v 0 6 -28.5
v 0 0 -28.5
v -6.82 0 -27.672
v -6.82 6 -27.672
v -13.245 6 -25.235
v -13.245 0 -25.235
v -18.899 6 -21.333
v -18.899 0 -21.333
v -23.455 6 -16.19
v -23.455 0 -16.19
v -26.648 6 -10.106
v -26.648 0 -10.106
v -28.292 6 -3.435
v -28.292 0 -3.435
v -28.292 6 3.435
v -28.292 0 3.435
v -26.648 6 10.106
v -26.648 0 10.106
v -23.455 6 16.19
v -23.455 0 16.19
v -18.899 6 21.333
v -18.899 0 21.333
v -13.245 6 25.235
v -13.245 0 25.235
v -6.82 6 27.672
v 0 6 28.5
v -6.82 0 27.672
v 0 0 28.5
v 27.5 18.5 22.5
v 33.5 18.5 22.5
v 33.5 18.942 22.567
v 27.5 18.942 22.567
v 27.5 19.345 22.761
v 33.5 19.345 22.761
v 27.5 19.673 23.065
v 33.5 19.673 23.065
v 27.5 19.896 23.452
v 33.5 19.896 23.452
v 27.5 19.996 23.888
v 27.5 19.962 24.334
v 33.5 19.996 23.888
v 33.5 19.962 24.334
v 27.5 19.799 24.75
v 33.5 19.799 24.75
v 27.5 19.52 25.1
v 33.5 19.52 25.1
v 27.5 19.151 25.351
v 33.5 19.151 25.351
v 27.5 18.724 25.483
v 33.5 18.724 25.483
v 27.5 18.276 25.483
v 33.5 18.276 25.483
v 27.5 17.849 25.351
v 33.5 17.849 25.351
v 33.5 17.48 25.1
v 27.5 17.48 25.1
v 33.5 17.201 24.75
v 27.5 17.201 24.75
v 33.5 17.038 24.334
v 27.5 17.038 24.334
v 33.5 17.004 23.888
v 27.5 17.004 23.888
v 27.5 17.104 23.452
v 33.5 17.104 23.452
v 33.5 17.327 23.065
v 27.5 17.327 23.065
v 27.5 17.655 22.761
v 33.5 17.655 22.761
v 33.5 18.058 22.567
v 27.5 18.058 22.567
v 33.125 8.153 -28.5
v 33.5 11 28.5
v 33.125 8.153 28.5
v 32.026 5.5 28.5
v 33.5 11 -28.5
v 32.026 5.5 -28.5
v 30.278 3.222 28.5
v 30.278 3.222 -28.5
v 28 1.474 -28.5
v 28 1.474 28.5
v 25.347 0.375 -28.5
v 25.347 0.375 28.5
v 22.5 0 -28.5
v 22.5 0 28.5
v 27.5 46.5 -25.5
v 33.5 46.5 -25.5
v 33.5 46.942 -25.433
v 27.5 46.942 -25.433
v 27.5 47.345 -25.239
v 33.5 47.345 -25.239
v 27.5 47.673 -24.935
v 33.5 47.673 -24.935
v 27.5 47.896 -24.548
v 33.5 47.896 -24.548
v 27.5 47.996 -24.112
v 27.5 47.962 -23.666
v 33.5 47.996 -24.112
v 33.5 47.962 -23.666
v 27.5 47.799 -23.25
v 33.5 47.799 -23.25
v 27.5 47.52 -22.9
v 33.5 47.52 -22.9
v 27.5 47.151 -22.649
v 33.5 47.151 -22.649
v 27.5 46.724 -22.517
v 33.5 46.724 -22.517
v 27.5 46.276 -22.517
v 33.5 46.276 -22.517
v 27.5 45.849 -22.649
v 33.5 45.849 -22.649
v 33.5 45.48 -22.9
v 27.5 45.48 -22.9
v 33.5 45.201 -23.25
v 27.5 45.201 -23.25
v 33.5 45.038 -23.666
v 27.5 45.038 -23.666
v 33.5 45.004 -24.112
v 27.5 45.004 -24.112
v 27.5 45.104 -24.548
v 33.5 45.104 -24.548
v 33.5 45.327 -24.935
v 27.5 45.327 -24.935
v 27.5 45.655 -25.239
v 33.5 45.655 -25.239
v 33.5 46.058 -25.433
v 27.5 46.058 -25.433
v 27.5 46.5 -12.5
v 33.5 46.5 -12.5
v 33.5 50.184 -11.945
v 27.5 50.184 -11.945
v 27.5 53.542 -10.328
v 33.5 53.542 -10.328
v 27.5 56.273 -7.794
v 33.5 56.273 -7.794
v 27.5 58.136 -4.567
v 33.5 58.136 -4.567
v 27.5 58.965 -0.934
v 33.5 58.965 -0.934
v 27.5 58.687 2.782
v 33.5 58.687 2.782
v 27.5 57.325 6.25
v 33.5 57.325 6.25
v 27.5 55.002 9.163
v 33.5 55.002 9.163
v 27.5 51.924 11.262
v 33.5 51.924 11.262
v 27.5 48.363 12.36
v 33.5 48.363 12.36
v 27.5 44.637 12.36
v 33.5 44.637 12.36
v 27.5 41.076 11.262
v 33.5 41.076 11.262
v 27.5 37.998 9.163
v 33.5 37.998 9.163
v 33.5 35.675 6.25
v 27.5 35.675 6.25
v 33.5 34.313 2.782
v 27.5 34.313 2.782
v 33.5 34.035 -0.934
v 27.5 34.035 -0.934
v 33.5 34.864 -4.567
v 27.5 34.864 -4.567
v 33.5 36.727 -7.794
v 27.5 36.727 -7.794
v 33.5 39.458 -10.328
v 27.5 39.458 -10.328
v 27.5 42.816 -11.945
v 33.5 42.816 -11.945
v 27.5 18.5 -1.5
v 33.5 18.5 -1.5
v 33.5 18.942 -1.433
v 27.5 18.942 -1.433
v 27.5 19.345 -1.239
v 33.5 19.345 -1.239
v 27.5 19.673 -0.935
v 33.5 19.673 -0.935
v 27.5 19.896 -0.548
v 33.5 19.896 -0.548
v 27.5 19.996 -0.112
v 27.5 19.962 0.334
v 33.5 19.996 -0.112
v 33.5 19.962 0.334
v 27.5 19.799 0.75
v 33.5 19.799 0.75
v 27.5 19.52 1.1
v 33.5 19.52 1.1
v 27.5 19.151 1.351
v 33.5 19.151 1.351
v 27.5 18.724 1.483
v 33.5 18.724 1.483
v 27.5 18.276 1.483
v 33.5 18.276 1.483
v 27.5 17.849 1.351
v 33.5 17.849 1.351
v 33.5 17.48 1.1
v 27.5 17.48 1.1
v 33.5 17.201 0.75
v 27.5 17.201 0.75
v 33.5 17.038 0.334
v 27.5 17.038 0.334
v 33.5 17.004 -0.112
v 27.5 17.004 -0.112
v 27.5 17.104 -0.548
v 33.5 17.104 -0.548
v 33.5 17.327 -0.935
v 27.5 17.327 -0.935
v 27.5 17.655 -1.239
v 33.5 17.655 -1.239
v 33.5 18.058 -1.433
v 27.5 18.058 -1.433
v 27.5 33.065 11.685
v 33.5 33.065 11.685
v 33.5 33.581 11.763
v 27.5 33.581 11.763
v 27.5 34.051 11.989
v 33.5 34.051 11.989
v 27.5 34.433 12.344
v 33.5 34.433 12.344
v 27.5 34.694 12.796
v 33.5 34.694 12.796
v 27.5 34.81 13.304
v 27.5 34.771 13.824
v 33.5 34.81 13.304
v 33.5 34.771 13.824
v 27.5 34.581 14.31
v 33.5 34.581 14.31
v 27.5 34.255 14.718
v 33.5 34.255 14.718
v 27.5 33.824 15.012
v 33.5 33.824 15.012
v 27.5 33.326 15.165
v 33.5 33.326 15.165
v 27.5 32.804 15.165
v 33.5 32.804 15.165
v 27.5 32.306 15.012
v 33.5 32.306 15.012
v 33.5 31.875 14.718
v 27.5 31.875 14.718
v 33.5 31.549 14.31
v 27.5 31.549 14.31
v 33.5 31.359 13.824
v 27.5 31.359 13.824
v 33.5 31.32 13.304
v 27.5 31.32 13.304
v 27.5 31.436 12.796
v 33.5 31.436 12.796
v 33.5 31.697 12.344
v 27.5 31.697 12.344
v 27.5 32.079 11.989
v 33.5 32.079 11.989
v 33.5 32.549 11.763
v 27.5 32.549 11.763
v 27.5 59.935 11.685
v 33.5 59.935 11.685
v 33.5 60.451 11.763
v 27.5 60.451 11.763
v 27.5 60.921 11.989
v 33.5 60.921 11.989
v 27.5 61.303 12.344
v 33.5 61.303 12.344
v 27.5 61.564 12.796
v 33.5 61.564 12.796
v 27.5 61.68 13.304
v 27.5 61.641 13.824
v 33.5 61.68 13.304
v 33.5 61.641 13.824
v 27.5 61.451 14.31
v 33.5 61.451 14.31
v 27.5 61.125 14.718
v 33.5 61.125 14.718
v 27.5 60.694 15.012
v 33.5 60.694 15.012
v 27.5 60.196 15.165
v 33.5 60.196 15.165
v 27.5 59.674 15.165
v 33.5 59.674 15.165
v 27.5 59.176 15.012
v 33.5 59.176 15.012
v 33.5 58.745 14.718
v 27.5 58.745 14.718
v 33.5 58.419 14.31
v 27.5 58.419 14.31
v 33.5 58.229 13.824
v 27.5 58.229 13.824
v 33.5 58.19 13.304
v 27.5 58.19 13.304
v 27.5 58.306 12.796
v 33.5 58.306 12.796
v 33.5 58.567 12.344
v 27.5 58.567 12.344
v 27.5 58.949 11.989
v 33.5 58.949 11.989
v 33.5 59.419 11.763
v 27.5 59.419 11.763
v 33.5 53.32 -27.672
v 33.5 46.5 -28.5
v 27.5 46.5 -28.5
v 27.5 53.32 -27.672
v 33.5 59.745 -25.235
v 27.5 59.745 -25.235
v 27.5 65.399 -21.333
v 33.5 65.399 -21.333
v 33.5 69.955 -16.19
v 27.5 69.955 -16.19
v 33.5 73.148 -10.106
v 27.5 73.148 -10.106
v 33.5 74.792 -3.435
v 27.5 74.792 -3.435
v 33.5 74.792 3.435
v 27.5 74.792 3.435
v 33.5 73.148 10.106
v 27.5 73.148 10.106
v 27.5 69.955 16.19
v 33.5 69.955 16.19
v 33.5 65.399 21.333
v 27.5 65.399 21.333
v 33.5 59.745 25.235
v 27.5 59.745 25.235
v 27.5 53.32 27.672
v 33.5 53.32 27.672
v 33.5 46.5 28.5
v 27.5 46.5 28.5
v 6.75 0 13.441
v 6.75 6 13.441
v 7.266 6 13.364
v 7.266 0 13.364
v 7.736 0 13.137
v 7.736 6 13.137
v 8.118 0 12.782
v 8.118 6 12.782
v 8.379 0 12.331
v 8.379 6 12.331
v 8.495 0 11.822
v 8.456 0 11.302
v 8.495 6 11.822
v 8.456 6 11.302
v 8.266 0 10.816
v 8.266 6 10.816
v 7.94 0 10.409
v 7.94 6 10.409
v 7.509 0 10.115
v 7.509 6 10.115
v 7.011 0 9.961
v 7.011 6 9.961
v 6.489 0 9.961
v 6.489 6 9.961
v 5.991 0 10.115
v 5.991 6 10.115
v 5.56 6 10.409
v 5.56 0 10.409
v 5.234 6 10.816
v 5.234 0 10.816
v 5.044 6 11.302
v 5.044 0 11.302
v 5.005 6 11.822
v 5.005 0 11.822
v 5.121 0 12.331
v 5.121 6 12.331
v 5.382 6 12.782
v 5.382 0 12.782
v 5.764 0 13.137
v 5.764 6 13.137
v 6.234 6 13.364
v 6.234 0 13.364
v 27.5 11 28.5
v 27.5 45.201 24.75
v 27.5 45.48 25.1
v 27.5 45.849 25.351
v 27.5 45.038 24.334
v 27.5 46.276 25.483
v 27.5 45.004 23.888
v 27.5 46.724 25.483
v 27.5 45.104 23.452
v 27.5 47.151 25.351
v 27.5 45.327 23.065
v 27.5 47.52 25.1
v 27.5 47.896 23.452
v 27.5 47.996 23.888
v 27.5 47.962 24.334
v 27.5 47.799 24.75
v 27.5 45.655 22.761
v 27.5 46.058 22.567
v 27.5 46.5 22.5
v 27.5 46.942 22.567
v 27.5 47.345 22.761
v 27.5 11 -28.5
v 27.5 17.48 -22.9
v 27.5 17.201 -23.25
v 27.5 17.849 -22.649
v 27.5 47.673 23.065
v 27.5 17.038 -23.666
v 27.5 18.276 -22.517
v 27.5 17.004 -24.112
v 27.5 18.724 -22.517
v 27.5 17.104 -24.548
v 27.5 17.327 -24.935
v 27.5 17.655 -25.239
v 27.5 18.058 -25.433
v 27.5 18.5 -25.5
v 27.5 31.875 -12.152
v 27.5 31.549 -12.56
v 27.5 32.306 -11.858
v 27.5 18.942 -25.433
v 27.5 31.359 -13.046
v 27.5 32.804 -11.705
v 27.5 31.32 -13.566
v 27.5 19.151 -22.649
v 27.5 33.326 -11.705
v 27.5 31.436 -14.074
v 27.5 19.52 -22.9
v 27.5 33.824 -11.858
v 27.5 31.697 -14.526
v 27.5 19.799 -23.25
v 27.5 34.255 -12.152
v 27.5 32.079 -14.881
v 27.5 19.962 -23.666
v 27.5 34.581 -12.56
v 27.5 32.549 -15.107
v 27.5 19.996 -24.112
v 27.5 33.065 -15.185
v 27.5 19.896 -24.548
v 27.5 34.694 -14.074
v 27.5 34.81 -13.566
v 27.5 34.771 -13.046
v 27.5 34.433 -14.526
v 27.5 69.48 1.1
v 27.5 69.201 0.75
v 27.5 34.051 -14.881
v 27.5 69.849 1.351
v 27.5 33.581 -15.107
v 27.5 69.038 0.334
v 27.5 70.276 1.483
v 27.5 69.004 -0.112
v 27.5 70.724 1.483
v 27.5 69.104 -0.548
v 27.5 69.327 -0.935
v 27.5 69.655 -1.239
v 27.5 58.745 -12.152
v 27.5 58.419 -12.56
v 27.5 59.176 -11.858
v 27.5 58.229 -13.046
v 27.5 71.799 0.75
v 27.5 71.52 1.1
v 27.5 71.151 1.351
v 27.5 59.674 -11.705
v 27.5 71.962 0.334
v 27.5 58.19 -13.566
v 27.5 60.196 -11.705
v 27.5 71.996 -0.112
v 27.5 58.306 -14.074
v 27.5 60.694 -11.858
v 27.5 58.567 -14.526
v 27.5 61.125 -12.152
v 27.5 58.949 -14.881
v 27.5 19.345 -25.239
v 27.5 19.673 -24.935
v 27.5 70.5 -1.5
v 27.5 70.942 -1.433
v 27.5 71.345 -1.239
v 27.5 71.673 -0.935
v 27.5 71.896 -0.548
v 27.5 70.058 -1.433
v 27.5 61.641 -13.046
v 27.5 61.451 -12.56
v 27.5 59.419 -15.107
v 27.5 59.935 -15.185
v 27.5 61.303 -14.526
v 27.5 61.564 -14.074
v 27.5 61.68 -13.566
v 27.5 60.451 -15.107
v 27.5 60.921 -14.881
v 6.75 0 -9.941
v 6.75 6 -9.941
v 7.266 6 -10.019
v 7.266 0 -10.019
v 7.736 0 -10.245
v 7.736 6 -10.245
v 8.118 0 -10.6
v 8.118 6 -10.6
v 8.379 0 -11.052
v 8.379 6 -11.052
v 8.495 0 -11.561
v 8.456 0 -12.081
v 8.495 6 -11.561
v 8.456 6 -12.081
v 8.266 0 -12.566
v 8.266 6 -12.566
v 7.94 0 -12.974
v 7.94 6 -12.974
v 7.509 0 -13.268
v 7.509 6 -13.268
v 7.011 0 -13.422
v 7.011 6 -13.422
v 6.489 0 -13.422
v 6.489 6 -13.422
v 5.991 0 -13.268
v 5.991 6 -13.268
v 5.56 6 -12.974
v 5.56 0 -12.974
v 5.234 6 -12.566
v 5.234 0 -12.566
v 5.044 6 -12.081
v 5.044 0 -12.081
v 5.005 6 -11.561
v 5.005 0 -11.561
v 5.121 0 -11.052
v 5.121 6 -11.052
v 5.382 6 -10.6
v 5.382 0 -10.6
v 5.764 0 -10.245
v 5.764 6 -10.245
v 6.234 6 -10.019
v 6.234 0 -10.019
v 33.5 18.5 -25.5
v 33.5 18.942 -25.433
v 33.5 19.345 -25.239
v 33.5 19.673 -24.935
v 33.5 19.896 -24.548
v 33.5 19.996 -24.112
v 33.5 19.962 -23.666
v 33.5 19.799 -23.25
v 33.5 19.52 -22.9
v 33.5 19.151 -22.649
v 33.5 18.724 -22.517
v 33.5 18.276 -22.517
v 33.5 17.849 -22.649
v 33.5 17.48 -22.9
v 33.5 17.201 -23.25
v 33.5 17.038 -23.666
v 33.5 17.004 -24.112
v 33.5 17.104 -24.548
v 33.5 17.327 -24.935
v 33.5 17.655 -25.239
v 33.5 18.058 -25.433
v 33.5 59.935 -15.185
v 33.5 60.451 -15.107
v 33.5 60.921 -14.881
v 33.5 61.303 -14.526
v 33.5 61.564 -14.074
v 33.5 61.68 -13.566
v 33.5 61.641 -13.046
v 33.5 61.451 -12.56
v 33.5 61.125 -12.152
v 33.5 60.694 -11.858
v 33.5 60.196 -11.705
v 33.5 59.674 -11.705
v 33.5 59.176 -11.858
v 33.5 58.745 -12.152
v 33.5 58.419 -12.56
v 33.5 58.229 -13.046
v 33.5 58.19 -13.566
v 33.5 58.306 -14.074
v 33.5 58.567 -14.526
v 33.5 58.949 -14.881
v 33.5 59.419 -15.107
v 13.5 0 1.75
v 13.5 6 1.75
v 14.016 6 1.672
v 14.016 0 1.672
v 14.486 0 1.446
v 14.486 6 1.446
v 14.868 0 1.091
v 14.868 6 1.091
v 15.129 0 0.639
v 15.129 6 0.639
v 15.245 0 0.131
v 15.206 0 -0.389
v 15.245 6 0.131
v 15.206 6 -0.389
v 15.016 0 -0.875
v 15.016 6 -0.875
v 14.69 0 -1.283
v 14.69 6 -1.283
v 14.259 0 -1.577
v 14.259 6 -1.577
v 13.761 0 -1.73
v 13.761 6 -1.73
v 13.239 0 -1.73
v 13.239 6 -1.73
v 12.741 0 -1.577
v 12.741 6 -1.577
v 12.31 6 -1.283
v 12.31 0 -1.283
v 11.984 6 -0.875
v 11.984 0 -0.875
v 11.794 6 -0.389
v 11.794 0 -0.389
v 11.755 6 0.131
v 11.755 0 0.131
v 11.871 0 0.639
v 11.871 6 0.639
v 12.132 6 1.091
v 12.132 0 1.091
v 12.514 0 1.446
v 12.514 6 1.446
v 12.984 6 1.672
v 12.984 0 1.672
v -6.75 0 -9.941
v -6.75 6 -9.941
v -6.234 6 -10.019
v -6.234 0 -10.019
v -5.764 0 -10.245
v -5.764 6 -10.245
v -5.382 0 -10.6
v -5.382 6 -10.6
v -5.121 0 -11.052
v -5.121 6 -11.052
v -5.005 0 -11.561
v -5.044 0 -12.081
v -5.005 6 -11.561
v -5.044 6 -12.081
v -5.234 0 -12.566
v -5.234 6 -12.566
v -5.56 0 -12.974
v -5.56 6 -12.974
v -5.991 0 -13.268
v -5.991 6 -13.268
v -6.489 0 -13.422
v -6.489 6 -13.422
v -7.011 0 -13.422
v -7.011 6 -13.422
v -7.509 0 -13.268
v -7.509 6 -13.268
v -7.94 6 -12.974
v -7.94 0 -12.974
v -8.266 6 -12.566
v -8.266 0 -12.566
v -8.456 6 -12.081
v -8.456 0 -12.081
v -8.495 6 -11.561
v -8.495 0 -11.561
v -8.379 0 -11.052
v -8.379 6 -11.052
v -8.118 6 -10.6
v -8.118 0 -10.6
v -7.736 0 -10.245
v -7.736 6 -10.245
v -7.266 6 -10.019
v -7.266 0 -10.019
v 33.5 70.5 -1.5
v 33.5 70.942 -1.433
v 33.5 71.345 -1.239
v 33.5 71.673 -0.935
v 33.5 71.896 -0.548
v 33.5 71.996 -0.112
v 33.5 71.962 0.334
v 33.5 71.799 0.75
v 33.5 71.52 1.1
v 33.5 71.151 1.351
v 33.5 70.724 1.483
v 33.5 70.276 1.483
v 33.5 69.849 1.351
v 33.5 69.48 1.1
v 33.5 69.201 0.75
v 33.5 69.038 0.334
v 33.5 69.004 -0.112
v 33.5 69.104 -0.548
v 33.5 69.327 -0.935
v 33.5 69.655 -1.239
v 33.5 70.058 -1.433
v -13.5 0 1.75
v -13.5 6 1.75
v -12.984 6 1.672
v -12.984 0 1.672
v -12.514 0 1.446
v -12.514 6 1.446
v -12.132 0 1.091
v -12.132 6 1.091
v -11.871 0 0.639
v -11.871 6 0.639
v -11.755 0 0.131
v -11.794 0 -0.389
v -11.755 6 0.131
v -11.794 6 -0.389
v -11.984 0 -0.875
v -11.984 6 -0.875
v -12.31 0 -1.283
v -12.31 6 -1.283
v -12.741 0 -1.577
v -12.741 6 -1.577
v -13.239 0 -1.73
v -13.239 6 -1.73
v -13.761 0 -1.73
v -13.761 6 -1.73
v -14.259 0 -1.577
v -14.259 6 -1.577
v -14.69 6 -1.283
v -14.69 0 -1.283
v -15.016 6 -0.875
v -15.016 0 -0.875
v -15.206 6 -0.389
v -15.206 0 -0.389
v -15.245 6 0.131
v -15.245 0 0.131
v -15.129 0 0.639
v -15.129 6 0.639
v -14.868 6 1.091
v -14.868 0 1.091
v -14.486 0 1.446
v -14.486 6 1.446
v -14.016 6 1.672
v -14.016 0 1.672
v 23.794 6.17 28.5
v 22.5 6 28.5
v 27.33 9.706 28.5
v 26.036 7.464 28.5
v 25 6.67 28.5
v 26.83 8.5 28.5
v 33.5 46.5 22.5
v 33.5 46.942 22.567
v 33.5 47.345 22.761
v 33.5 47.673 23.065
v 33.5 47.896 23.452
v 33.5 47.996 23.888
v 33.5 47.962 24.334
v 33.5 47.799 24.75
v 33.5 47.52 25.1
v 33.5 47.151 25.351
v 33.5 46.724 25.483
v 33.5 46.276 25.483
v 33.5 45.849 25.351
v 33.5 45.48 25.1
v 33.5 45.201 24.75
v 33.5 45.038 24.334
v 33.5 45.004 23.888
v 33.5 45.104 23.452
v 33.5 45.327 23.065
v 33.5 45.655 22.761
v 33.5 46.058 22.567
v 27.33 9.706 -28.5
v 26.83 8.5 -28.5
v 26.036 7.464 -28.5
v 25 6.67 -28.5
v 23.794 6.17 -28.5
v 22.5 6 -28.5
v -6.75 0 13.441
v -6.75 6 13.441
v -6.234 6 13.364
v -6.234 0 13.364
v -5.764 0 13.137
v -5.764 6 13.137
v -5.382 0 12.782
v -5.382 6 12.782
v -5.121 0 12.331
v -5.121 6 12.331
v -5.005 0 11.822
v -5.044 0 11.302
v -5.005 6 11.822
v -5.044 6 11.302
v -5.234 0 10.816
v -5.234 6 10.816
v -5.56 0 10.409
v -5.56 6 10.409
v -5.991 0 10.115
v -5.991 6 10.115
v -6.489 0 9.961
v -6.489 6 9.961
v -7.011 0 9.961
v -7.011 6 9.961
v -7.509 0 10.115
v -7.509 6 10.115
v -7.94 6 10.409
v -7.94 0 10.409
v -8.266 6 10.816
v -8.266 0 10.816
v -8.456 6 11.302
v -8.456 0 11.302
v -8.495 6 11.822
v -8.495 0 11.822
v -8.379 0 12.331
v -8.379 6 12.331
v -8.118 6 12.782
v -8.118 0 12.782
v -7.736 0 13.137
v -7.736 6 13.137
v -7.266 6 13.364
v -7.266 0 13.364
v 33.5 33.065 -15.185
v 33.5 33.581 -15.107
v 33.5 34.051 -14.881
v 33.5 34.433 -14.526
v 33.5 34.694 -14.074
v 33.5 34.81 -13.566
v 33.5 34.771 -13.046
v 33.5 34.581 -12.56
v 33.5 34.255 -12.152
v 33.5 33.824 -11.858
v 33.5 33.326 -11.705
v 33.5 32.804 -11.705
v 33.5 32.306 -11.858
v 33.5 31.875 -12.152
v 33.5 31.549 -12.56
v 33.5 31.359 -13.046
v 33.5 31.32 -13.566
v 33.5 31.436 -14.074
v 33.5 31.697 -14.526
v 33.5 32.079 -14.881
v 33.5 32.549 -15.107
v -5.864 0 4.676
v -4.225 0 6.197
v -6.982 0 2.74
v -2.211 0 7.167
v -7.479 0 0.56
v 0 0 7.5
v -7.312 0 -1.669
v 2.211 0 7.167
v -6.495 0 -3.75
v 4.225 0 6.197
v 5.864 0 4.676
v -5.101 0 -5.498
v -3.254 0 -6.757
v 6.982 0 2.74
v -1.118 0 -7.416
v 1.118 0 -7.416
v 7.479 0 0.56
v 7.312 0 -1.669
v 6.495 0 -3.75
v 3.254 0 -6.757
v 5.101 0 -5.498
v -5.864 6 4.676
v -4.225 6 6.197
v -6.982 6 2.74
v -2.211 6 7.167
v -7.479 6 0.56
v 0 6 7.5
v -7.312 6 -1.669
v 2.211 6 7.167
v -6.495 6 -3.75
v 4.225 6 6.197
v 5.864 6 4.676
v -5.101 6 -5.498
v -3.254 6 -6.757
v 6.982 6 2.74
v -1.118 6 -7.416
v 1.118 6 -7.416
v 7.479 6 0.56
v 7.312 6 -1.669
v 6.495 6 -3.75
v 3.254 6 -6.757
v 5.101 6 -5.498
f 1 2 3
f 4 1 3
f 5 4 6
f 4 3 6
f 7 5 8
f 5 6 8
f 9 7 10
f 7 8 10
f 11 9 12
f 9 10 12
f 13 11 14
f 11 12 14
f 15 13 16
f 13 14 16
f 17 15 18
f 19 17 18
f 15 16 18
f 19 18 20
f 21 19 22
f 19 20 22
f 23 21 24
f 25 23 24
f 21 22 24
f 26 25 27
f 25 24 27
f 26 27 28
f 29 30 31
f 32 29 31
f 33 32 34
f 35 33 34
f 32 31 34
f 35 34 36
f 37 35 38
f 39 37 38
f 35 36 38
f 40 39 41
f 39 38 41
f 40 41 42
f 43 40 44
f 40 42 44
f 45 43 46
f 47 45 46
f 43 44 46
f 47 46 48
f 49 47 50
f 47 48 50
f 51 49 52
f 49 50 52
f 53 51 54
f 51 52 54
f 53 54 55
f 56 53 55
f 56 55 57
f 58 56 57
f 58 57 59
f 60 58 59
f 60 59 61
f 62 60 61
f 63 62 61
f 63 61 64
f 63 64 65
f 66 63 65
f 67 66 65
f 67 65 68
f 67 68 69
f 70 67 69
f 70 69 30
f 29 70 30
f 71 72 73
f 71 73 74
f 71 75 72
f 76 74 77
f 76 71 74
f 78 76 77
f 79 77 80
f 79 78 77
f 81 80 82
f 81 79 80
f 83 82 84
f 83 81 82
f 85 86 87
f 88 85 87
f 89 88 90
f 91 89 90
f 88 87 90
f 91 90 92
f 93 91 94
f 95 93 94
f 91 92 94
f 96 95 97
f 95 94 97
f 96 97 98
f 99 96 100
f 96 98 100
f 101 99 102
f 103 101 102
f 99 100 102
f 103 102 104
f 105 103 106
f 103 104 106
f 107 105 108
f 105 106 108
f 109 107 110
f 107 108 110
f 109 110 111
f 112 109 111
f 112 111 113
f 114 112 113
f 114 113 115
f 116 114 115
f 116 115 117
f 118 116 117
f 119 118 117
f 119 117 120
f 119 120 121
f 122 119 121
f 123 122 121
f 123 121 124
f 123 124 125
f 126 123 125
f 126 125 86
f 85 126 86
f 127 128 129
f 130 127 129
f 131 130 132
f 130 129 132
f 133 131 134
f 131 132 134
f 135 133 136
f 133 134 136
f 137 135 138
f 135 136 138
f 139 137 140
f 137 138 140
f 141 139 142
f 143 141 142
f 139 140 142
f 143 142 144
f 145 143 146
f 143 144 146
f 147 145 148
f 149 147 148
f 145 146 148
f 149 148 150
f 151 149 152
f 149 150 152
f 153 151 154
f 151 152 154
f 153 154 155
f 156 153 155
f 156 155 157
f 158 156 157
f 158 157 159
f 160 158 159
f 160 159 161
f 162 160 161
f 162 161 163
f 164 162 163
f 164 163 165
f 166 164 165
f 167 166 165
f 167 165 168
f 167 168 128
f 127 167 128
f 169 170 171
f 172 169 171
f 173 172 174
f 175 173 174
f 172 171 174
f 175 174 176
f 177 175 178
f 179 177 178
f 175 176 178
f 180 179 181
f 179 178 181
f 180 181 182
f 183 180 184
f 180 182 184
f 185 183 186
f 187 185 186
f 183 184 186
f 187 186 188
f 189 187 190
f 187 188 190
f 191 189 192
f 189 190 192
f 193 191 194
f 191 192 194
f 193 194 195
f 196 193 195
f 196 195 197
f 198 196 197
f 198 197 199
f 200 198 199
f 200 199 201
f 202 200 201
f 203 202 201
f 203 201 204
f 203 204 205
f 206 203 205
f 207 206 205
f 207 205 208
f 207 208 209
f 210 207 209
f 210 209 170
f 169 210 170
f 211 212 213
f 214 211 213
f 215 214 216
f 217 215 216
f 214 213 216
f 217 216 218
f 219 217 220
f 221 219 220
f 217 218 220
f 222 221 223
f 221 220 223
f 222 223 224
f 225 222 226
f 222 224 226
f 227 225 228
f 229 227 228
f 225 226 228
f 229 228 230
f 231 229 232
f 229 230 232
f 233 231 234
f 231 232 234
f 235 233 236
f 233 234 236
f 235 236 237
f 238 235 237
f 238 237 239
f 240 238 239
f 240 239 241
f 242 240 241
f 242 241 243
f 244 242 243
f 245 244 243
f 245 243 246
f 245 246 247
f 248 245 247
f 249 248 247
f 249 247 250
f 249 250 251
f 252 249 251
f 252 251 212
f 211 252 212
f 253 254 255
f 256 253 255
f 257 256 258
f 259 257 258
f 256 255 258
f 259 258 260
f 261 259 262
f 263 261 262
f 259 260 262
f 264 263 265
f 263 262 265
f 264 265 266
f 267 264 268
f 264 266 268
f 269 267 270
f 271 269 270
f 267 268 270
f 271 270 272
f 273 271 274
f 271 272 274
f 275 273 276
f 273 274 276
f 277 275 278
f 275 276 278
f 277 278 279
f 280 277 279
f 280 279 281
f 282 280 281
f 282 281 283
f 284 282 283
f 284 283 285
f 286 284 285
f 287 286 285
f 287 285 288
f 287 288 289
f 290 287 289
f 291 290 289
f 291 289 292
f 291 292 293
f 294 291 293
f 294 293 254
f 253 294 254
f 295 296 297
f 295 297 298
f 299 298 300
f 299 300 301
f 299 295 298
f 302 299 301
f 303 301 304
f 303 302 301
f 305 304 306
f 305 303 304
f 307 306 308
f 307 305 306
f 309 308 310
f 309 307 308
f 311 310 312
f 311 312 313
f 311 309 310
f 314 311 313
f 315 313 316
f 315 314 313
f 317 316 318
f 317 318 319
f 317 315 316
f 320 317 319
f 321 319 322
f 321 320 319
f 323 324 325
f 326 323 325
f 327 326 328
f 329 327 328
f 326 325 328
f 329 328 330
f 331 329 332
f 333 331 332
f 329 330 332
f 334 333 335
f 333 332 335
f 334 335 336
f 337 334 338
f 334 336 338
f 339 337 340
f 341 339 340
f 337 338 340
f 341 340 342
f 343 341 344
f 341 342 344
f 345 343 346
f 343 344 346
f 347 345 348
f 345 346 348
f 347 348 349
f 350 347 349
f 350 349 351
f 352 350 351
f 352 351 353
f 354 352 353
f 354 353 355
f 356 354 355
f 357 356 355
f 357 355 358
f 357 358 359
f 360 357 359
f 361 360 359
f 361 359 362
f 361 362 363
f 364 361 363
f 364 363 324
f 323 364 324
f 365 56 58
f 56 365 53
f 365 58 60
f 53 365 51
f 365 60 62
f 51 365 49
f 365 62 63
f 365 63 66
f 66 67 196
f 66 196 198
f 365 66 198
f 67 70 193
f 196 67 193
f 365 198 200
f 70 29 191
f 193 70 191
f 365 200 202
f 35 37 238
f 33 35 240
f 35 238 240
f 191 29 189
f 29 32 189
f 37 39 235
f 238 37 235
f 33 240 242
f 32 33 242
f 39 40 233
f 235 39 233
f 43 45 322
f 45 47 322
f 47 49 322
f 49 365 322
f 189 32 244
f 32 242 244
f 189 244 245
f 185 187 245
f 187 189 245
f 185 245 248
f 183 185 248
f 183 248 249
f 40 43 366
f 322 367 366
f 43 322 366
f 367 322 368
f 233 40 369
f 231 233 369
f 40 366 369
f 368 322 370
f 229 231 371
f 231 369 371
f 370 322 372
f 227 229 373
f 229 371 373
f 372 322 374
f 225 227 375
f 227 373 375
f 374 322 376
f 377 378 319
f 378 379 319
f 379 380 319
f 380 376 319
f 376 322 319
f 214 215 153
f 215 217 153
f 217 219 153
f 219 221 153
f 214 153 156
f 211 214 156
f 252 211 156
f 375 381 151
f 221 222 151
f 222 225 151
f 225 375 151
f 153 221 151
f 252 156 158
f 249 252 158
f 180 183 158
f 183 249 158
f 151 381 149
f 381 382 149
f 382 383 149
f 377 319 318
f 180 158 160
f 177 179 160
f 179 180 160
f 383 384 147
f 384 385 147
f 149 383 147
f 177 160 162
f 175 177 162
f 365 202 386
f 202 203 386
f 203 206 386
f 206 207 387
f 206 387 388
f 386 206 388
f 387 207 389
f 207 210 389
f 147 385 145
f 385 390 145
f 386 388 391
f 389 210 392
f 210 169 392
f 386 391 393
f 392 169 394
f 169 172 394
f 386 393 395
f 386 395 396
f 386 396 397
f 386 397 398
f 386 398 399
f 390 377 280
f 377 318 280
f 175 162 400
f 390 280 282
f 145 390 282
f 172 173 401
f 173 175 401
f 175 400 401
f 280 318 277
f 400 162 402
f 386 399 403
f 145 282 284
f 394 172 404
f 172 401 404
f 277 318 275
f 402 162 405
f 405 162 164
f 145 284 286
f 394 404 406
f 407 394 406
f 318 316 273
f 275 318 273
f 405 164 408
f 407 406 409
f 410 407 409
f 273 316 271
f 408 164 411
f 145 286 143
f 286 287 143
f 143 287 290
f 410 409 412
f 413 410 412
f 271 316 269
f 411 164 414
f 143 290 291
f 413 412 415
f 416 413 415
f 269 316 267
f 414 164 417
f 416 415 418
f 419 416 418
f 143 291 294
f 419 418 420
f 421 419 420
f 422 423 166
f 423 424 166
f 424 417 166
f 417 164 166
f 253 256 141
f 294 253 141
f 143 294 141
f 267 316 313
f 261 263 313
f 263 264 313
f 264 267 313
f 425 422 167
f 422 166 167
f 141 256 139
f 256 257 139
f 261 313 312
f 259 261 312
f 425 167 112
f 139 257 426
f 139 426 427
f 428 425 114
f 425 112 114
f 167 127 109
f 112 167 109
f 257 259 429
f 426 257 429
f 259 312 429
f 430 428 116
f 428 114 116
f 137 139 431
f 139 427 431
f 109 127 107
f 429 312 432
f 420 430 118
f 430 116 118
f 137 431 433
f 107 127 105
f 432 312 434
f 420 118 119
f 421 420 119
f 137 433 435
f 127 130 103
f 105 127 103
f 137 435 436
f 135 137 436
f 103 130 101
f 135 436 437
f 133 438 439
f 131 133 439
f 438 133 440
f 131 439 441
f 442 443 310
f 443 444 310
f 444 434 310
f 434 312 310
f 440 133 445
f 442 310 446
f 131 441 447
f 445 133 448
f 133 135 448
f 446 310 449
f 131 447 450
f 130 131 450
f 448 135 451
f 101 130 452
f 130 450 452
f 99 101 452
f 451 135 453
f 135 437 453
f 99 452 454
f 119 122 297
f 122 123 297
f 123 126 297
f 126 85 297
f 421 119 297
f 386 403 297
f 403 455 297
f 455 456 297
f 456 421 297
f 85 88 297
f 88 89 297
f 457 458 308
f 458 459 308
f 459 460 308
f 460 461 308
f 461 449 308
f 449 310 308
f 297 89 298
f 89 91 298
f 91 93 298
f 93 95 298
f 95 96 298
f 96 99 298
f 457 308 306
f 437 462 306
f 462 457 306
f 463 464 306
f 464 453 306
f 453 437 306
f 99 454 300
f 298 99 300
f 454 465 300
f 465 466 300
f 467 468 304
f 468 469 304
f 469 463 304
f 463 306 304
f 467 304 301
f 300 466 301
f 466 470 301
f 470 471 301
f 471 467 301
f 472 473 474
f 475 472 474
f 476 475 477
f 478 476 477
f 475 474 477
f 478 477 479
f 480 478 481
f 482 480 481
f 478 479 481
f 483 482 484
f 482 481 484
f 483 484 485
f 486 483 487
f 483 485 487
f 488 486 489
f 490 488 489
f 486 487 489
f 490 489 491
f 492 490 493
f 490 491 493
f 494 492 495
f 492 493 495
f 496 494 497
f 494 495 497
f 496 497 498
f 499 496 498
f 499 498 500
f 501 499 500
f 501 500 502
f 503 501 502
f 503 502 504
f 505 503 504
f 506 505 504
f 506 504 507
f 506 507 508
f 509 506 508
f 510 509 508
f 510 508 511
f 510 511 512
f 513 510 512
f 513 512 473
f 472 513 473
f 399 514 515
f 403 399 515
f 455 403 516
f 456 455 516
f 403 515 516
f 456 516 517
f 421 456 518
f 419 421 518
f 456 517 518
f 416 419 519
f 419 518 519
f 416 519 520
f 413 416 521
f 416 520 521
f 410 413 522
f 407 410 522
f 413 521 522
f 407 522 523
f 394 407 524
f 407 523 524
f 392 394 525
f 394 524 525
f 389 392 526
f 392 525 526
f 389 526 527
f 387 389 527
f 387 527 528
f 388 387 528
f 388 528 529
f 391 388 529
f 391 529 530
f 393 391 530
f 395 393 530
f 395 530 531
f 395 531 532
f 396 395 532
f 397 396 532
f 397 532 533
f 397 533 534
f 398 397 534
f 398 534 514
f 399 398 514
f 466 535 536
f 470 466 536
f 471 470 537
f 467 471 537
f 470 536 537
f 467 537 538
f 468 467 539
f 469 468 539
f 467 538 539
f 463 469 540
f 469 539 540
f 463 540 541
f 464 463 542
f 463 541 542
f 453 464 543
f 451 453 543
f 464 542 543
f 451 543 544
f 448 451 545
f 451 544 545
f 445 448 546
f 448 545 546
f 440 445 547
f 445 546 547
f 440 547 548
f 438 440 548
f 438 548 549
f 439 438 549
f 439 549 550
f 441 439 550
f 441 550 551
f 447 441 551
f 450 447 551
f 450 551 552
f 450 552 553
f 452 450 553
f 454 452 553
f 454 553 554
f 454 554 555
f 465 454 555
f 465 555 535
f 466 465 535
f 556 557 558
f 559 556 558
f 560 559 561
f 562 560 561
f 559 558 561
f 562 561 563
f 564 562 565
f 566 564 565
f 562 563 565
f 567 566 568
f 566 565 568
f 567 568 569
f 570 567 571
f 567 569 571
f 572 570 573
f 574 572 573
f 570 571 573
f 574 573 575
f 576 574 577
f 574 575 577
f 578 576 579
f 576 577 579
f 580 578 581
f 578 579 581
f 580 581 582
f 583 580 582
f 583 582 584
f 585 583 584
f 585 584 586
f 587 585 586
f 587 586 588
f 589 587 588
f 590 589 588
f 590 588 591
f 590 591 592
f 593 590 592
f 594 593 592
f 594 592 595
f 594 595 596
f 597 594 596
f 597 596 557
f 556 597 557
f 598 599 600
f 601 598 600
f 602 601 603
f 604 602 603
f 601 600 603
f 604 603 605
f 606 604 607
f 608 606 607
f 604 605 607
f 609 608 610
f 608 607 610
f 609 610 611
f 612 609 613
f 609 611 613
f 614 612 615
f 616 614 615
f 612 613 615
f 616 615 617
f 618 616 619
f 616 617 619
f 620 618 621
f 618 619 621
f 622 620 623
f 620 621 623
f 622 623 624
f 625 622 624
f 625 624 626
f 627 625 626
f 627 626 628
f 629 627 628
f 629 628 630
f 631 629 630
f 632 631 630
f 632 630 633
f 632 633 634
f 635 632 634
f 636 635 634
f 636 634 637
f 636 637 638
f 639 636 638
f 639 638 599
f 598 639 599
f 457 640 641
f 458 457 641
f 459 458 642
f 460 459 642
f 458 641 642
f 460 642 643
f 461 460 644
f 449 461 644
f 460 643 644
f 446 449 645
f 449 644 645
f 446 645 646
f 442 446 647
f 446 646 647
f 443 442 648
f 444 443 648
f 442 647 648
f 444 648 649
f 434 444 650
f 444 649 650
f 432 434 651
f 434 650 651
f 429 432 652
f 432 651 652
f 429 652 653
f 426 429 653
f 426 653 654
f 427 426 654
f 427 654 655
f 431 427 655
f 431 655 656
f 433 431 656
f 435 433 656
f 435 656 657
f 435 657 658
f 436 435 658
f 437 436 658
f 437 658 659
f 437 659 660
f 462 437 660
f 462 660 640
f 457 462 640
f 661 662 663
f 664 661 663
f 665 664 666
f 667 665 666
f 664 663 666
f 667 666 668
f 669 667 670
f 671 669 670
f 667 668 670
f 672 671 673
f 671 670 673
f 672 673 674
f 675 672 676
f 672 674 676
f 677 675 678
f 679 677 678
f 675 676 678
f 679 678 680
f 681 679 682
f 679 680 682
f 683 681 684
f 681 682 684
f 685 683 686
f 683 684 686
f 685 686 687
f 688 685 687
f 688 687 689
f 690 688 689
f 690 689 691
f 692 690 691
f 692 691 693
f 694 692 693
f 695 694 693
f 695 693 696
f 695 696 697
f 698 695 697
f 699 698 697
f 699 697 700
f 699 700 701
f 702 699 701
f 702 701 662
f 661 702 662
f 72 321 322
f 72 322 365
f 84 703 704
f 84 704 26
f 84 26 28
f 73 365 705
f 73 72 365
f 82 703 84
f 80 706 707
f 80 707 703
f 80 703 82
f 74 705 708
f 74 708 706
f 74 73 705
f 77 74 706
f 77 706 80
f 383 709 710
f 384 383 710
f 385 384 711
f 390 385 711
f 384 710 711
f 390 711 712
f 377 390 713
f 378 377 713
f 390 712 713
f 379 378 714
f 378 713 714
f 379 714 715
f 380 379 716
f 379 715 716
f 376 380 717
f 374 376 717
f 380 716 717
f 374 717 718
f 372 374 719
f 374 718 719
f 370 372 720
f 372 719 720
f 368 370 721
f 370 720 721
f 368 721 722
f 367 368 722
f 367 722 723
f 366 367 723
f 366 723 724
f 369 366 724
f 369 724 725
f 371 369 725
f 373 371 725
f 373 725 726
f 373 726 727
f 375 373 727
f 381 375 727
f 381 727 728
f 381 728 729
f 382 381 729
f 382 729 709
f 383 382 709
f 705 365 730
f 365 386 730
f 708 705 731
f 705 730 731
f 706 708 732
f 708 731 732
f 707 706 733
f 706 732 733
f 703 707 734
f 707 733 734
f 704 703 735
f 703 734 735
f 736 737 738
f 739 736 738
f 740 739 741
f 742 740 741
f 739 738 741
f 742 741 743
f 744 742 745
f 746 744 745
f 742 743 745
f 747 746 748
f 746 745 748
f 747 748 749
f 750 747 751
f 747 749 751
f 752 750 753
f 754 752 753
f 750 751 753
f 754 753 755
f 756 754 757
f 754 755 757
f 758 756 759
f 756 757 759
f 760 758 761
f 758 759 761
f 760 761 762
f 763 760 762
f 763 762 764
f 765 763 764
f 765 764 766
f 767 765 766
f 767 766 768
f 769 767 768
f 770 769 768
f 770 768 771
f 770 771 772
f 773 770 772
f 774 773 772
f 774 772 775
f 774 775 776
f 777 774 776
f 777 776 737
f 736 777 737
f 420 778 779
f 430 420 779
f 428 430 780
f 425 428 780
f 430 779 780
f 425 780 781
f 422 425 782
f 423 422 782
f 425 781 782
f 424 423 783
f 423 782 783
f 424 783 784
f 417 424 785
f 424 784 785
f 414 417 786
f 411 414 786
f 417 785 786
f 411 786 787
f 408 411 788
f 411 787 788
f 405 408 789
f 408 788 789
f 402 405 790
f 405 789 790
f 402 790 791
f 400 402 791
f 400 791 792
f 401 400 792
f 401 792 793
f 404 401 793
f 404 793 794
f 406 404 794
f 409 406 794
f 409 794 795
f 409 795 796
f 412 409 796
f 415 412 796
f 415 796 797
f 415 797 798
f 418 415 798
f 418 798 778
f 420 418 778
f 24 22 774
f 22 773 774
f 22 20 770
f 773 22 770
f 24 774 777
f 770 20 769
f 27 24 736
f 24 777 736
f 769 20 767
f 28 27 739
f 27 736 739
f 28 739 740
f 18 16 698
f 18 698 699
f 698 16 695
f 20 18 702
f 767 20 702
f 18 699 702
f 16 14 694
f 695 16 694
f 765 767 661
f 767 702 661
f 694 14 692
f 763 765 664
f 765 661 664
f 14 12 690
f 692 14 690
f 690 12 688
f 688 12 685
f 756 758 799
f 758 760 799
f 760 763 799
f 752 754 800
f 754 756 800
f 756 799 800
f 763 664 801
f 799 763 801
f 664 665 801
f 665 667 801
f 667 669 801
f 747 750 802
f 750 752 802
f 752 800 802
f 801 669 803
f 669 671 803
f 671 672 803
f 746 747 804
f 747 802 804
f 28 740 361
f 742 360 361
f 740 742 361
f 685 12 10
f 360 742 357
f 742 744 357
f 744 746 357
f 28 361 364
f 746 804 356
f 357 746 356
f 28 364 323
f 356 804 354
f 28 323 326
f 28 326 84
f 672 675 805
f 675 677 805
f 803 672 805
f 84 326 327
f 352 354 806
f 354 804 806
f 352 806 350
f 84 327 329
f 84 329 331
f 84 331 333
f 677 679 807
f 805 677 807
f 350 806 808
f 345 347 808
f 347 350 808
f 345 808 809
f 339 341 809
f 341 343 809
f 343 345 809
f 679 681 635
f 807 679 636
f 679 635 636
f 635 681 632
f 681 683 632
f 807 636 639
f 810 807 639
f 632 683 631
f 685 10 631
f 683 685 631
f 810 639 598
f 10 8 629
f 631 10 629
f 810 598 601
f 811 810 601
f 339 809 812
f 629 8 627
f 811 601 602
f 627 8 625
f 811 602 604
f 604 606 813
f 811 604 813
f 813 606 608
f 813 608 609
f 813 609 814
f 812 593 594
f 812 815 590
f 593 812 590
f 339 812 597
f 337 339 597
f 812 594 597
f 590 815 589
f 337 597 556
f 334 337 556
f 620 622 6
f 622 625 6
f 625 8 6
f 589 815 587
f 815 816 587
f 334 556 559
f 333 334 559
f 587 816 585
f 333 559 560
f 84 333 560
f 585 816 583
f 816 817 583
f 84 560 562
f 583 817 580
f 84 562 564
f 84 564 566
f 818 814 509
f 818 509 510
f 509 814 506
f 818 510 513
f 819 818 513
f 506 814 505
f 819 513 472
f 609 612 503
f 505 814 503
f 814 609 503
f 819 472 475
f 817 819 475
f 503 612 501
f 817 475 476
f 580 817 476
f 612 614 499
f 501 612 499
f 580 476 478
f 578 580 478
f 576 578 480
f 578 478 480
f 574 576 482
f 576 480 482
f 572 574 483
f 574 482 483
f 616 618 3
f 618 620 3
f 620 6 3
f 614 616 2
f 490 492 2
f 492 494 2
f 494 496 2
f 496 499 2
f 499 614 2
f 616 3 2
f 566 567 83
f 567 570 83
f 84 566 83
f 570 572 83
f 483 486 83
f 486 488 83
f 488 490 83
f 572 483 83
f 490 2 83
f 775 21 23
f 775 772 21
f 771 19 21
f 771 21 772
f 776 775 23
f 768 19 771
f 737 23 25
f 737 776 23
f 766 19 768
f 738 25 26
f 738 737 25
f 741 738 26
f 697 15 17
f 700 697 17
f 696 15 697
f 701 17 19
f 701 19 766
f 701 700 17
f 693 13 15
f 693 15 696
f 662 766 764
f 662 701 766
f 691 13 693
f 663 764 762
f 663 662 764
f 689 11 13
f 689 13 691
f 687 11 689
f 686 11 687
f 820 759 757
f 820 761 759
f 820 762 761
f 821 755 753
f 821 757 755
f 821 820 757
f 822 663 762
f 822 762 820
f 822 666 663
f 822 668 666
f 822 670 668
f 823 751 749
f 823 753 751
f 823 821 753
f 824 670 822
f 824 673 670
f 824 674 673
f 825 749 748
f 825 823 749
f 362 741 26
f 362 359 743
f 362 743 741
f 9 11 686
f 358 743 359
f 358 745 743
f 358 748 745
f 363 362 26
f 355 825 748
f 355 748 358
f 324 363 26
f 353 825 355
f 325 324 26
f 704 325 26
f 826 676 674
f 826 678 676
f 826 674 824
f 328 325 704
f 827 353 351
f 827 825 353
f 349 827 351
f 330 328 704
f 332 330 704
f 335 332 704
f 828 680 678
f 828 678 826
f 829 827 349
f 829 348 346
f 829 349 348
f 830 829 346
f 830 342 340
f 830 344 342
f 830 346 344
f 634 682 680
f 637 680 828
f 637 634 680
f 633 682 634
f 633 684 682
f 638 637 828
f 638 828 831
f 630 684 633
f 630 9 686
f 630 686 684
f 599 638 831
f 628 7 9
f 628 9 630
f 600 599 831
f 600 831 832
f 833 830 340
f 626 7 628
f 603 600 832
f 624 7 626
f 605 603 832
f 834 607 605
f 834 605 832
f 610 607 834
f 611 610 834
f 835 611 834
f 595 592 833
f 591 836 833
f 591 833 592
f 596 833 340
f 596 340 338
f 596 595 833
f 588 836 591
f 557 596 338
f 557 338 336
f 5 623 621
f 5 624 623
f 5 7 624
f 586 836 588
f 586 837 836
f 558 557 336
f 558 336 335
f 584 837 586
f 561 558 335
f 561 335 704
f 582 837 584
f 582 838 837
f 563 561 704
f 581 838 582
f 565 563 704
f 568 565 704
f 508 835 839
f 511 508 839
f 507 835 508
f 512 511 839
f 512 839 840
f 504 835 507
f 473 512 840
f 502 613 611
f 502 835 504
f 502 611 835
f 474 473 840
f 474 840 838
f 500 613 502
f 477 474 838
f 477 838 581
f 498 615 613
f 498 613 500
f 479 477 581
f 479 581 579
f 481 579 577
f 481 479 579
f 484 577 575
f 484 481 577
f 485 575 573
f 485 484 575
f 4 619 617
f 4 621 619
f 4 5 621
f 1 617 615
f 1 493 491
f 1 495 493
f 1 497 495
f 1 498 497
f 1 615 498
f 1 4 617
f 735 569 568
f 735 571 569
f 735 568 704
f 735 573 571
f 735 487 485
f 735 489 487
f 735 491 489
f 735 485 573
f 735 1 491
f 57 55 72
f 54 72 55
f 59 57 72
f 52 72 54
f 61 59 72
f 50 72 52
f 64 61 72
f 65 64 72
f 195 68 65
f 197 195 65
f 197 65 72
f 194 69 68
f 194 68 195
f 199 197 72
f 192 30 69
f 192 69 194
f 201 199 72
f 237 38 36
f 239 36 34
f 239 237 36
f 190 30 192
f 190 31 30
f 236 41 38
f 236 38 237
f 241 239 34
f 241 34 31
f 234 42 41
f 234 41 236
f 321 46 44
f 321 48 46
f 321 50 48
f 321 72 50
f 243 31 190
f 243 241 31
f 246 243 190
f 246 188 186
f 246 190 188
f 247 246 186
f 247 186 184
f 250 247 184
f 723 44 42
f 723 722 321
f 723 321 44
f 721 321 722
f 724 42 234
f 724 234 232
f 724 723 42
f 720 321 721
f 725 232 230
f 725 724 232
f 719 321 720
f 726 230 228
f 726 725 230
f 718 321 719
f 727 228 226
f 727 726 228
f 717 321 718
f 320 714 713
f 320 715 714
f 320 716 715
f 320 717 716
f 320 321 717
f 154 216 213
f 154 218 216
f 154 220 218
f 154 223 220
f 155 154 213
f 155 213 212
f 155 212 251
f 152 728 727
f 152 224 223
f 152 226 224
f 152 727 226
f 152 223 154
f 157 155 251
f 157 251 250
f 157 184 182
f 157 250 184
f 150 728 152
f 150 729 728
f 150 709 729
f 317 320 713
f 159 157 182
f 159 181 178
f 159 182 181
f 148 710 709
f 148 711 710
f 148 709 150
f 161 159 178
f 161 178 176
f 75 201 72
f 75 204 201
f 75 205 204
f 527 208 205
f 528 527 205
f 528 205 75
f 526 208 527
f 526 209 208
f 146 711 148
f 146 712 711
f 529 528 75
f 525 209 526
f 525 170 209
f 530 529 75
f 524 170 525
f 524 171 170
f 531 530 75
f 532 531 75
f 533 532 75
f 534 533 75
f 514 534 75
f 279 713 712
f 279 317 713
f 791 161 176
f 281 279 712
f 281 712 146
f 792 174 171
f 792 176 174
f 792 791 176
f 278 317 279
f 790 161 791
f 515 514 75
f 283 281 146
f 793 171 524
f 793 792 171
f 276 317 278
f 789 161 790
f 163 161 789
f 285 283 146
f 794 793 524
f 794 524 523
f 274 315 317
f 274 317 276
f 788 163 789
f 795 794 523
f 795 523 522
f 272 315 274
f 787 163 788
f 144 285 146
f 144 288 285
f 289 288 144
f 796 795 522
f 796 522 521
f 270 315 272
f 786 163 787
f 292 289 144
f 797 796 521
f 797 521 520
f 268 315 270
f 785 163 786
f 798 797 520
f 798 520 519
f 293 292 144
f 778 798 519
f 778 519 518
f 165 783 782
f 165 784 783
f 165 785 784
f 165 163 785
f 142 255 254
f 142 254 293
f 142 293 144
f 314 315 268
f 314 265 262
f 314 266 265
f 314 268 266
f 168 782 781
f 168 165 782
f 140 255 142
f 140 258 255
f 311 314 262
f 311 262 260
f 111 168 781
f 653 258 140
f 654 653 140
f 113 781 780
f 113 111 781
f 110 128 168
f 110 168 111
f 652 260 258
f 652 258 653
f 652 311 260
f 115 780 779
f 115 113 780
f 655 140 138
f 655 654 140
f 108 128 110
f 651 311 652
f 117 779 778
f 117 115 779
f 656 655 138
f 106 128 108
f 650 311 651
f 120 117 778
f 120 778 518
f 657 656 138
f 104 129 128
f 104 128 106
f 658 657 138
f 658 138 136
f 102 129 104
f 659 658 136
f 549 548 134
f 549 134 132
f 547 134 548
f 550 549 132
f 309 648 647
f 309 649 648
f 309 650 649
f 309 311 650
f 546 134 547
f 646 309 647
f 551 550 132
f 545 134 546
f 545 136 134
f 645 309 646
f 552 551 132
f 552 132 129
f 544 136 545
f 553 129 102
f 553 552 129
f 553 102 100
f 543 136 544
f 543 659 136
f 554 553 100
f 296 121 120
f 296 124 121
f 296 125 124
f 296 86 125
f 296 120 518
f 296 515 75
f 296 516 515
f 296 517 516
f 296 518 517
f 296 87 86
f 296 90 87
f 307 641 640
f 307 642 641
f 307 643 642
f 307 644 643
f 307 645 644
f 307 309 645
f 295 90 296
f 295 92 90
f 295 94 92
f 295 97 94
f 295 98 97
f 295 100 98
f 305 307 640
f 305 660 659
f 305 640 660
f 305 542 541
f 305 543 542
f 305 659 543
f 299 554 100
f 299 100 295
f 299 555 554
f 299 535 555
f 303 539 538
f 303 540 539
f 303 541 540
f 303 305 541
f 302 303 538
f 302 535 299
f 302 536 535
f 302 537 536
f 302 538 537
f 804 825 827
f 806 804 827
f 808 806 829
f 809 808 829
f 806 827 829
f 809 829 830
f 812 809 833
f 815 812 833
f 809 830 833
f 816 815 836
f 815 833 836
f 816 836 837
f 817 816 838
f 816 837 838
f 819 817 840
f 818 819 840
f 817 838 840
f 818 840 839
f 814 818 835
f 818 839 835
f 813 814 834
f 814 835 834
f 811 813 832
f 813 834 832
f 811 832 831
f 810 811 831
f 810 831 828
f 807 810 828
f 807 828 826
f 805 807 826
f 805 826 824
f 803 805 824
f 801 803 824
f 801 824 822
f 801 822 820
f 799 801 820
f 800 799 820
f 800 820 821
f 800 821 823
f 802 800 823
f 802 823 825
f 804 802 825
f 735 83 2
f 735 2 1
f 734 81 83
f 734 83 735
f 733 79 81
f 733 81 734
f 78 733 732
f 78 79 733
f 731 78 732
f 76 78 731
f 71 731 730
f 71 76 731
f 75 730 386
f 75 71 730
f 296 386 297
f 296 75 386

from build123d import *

# Parameters (mm, degrees)
EXTRUDE_1_DEPTH     = 6
EXTRUDE_2_DEPTH     = 6
SKETCH_4_R          = 1.75
CUT_EXTRUDE_1_DEPTH = 16
SKETCH_6_R          = 1.75
CUT_EXTRUDE_2_DEPTH = 16
FILLET_1_R          = 5
FILLET_2_R          = 11
SKETCH_7_R          = 1.5
SKETCH_7_R_2        = 12.5
CUT_EXTRUDE_3_DEPTH = 10
SKETCH_8_R          = 7.5
CUT_EXTRUDE_4_DEPTH = 10


with BuildPart() as part:
    # 草图1 → 凸台-拉伸1 (new body)
    with BuildSketch(Plane(origin=(0, 0, 0), x_dir=(1, 0, 0), z_dir=(0, 1, 0))):
        with BuildLine():
            ThreePointArc((0, 28.5), (-28.5, 0), (0, -28.5))
            Line((0, -28.5), (33.5, -28.5))
            Line((33.5, -28.5), (33.5, 28.5))
            Line((33.5, 28.5), (0, 28.5))
        make_face()
    extrude(amount=EXTRUDE_1_DEPTH)

    # 草图3 → 凸台-拉伸2 (add)
    with BuildSketch(Plane(origin=(33.5, 0, 0), x_dir=(0, 0, -1), z_dir=(1, 0, 0))):
        with BuildLine():
            Line((-28.5, 46.5), (-28.5, 6))
            Line((-28.5, 6), (28.5, 6))
            Line((28.5, 6), (28.5, 46.5))
            ThreePointArc((28.5, 46.5), (0, 75), (-28.5, 46.5))
        make_face()
    extrude(amount=-EXTRUDE_2_DEPTH)

    # 草图4 → 切除-拉伸1 (cut)
    with BuildSketch(Plane(origin=(0, 6, 0), x_dir=(1, 0, 0), z_dir=(0, 1, 0))):
        with Locations(Location((-13.5, 0, 0), (0, 0, 270))):
            Circle(SKETCH_4_R)
        with Locations(Location((-6.75, 11.691342951, 0), (0, 0, 270))):
            Circle(SKETCH_4_R)
        with Locations(Location((6.75, 11.691342951, 0), (0, 0, 270))):
            Circle(SKETCH_4_R)
        with Locations(Location((13.5, 0, 0), (0, 0, 270))):
            Circle(SKETCH_4_R)
        with Locations(Location((6.75, -11.691342951, 0), (0, 0, 270))):
            Circle(SKETCH_4_R)
        with Locations(Location((-6.75, -11.691342951, 0), (0, 0, 270))):
            Circle(SKETCH_4_R)
    extrude(amount=-CUT_EXTRUDE_1_DEPTH, mode=Mode.SUBTRACT)

    # 草图6 → 切除-拉伸2 (cut)
    with BuildSketch(Plane(origin=(33.5, 0, 0), x_dir=(0, 0, -1), z_dir=(1, 0, 0))):
        with Locations((-13.435028843, 59.935028843)):
            Circle(SKETCH_6_R)
        with Locations((13.435028843, 59.935028843)):
            Circle(SKETCH_6_R)
        with Locations((13.435028843, 33.064971157)):
            Circle(SKETCH_6_R)
        with Locations((-13.435028843, 33.064971157)):
            Circle(SKETCH_6_R)
    extrude(amount=-CUT_EXTRUDE_2_DEPTH, mode=Mode.SUBTRACT)

    # 圆角1
    fillet_1_edges = [part.edges().sort_by_distance(p)[0] for p in [
        (27.5, 6, 0),
    ]]
    fillet(fillet_1_edges, radius=FILLET_1_R)

    # 圆角2
    fillet_2_edges = [part.edges().sort_by_distance(p)[0] for p in [
        (33.5, 0, 0),
    ]]
    fillet(fillet_2_edges, radius=FILLET_2_R)

    # 草图7 → 切除-拉伸3 (cut)
    with BuildSketch(Plane(origin=(33.5, 0, 0), x_dir=(0, 0, -1), z_dir=(1, 0, 0))):
        with Locations((0, 70.5)):
            Circle(SKETCH_7_R)
        with Locations((-24, 46.5)):
            Circle(SKETCH_7_R)
        with Locations((24, 46.5)):
            Circle(SKETCH_7_R)
        with Locations((-24, 18.5)):
            Circle(SKETCH_7_R)
        with Locations((24, 18.5)):
            Circle(SKETCH_7_R)
        with Locations((0, 18.5)):
            Circle(SKETCH_7_R)
        with Locations((0, 46.5)):
            Circle(SKETCH_7_R_2)
    extrude(amount=-CUT_EXTRUDE_3_DEPTH, mode=Mode.SUBTRACT)

    # 草图8 → 切除-拉伸4 (cut)
    with BuildSketch(Plane(origin=(0, 6, 0), x_dir=(1, 0, 0), z_dir=(0, 1, 0))):
        with Locations(Location((0, 0, 0), (0, 0, 270))):
            Circle(SKETCH_8_R)
    extrude(amount=-CUT_EXTRUDE_4_DEPTH, mode=Mode.SUBTRACT)


solid = part.part
